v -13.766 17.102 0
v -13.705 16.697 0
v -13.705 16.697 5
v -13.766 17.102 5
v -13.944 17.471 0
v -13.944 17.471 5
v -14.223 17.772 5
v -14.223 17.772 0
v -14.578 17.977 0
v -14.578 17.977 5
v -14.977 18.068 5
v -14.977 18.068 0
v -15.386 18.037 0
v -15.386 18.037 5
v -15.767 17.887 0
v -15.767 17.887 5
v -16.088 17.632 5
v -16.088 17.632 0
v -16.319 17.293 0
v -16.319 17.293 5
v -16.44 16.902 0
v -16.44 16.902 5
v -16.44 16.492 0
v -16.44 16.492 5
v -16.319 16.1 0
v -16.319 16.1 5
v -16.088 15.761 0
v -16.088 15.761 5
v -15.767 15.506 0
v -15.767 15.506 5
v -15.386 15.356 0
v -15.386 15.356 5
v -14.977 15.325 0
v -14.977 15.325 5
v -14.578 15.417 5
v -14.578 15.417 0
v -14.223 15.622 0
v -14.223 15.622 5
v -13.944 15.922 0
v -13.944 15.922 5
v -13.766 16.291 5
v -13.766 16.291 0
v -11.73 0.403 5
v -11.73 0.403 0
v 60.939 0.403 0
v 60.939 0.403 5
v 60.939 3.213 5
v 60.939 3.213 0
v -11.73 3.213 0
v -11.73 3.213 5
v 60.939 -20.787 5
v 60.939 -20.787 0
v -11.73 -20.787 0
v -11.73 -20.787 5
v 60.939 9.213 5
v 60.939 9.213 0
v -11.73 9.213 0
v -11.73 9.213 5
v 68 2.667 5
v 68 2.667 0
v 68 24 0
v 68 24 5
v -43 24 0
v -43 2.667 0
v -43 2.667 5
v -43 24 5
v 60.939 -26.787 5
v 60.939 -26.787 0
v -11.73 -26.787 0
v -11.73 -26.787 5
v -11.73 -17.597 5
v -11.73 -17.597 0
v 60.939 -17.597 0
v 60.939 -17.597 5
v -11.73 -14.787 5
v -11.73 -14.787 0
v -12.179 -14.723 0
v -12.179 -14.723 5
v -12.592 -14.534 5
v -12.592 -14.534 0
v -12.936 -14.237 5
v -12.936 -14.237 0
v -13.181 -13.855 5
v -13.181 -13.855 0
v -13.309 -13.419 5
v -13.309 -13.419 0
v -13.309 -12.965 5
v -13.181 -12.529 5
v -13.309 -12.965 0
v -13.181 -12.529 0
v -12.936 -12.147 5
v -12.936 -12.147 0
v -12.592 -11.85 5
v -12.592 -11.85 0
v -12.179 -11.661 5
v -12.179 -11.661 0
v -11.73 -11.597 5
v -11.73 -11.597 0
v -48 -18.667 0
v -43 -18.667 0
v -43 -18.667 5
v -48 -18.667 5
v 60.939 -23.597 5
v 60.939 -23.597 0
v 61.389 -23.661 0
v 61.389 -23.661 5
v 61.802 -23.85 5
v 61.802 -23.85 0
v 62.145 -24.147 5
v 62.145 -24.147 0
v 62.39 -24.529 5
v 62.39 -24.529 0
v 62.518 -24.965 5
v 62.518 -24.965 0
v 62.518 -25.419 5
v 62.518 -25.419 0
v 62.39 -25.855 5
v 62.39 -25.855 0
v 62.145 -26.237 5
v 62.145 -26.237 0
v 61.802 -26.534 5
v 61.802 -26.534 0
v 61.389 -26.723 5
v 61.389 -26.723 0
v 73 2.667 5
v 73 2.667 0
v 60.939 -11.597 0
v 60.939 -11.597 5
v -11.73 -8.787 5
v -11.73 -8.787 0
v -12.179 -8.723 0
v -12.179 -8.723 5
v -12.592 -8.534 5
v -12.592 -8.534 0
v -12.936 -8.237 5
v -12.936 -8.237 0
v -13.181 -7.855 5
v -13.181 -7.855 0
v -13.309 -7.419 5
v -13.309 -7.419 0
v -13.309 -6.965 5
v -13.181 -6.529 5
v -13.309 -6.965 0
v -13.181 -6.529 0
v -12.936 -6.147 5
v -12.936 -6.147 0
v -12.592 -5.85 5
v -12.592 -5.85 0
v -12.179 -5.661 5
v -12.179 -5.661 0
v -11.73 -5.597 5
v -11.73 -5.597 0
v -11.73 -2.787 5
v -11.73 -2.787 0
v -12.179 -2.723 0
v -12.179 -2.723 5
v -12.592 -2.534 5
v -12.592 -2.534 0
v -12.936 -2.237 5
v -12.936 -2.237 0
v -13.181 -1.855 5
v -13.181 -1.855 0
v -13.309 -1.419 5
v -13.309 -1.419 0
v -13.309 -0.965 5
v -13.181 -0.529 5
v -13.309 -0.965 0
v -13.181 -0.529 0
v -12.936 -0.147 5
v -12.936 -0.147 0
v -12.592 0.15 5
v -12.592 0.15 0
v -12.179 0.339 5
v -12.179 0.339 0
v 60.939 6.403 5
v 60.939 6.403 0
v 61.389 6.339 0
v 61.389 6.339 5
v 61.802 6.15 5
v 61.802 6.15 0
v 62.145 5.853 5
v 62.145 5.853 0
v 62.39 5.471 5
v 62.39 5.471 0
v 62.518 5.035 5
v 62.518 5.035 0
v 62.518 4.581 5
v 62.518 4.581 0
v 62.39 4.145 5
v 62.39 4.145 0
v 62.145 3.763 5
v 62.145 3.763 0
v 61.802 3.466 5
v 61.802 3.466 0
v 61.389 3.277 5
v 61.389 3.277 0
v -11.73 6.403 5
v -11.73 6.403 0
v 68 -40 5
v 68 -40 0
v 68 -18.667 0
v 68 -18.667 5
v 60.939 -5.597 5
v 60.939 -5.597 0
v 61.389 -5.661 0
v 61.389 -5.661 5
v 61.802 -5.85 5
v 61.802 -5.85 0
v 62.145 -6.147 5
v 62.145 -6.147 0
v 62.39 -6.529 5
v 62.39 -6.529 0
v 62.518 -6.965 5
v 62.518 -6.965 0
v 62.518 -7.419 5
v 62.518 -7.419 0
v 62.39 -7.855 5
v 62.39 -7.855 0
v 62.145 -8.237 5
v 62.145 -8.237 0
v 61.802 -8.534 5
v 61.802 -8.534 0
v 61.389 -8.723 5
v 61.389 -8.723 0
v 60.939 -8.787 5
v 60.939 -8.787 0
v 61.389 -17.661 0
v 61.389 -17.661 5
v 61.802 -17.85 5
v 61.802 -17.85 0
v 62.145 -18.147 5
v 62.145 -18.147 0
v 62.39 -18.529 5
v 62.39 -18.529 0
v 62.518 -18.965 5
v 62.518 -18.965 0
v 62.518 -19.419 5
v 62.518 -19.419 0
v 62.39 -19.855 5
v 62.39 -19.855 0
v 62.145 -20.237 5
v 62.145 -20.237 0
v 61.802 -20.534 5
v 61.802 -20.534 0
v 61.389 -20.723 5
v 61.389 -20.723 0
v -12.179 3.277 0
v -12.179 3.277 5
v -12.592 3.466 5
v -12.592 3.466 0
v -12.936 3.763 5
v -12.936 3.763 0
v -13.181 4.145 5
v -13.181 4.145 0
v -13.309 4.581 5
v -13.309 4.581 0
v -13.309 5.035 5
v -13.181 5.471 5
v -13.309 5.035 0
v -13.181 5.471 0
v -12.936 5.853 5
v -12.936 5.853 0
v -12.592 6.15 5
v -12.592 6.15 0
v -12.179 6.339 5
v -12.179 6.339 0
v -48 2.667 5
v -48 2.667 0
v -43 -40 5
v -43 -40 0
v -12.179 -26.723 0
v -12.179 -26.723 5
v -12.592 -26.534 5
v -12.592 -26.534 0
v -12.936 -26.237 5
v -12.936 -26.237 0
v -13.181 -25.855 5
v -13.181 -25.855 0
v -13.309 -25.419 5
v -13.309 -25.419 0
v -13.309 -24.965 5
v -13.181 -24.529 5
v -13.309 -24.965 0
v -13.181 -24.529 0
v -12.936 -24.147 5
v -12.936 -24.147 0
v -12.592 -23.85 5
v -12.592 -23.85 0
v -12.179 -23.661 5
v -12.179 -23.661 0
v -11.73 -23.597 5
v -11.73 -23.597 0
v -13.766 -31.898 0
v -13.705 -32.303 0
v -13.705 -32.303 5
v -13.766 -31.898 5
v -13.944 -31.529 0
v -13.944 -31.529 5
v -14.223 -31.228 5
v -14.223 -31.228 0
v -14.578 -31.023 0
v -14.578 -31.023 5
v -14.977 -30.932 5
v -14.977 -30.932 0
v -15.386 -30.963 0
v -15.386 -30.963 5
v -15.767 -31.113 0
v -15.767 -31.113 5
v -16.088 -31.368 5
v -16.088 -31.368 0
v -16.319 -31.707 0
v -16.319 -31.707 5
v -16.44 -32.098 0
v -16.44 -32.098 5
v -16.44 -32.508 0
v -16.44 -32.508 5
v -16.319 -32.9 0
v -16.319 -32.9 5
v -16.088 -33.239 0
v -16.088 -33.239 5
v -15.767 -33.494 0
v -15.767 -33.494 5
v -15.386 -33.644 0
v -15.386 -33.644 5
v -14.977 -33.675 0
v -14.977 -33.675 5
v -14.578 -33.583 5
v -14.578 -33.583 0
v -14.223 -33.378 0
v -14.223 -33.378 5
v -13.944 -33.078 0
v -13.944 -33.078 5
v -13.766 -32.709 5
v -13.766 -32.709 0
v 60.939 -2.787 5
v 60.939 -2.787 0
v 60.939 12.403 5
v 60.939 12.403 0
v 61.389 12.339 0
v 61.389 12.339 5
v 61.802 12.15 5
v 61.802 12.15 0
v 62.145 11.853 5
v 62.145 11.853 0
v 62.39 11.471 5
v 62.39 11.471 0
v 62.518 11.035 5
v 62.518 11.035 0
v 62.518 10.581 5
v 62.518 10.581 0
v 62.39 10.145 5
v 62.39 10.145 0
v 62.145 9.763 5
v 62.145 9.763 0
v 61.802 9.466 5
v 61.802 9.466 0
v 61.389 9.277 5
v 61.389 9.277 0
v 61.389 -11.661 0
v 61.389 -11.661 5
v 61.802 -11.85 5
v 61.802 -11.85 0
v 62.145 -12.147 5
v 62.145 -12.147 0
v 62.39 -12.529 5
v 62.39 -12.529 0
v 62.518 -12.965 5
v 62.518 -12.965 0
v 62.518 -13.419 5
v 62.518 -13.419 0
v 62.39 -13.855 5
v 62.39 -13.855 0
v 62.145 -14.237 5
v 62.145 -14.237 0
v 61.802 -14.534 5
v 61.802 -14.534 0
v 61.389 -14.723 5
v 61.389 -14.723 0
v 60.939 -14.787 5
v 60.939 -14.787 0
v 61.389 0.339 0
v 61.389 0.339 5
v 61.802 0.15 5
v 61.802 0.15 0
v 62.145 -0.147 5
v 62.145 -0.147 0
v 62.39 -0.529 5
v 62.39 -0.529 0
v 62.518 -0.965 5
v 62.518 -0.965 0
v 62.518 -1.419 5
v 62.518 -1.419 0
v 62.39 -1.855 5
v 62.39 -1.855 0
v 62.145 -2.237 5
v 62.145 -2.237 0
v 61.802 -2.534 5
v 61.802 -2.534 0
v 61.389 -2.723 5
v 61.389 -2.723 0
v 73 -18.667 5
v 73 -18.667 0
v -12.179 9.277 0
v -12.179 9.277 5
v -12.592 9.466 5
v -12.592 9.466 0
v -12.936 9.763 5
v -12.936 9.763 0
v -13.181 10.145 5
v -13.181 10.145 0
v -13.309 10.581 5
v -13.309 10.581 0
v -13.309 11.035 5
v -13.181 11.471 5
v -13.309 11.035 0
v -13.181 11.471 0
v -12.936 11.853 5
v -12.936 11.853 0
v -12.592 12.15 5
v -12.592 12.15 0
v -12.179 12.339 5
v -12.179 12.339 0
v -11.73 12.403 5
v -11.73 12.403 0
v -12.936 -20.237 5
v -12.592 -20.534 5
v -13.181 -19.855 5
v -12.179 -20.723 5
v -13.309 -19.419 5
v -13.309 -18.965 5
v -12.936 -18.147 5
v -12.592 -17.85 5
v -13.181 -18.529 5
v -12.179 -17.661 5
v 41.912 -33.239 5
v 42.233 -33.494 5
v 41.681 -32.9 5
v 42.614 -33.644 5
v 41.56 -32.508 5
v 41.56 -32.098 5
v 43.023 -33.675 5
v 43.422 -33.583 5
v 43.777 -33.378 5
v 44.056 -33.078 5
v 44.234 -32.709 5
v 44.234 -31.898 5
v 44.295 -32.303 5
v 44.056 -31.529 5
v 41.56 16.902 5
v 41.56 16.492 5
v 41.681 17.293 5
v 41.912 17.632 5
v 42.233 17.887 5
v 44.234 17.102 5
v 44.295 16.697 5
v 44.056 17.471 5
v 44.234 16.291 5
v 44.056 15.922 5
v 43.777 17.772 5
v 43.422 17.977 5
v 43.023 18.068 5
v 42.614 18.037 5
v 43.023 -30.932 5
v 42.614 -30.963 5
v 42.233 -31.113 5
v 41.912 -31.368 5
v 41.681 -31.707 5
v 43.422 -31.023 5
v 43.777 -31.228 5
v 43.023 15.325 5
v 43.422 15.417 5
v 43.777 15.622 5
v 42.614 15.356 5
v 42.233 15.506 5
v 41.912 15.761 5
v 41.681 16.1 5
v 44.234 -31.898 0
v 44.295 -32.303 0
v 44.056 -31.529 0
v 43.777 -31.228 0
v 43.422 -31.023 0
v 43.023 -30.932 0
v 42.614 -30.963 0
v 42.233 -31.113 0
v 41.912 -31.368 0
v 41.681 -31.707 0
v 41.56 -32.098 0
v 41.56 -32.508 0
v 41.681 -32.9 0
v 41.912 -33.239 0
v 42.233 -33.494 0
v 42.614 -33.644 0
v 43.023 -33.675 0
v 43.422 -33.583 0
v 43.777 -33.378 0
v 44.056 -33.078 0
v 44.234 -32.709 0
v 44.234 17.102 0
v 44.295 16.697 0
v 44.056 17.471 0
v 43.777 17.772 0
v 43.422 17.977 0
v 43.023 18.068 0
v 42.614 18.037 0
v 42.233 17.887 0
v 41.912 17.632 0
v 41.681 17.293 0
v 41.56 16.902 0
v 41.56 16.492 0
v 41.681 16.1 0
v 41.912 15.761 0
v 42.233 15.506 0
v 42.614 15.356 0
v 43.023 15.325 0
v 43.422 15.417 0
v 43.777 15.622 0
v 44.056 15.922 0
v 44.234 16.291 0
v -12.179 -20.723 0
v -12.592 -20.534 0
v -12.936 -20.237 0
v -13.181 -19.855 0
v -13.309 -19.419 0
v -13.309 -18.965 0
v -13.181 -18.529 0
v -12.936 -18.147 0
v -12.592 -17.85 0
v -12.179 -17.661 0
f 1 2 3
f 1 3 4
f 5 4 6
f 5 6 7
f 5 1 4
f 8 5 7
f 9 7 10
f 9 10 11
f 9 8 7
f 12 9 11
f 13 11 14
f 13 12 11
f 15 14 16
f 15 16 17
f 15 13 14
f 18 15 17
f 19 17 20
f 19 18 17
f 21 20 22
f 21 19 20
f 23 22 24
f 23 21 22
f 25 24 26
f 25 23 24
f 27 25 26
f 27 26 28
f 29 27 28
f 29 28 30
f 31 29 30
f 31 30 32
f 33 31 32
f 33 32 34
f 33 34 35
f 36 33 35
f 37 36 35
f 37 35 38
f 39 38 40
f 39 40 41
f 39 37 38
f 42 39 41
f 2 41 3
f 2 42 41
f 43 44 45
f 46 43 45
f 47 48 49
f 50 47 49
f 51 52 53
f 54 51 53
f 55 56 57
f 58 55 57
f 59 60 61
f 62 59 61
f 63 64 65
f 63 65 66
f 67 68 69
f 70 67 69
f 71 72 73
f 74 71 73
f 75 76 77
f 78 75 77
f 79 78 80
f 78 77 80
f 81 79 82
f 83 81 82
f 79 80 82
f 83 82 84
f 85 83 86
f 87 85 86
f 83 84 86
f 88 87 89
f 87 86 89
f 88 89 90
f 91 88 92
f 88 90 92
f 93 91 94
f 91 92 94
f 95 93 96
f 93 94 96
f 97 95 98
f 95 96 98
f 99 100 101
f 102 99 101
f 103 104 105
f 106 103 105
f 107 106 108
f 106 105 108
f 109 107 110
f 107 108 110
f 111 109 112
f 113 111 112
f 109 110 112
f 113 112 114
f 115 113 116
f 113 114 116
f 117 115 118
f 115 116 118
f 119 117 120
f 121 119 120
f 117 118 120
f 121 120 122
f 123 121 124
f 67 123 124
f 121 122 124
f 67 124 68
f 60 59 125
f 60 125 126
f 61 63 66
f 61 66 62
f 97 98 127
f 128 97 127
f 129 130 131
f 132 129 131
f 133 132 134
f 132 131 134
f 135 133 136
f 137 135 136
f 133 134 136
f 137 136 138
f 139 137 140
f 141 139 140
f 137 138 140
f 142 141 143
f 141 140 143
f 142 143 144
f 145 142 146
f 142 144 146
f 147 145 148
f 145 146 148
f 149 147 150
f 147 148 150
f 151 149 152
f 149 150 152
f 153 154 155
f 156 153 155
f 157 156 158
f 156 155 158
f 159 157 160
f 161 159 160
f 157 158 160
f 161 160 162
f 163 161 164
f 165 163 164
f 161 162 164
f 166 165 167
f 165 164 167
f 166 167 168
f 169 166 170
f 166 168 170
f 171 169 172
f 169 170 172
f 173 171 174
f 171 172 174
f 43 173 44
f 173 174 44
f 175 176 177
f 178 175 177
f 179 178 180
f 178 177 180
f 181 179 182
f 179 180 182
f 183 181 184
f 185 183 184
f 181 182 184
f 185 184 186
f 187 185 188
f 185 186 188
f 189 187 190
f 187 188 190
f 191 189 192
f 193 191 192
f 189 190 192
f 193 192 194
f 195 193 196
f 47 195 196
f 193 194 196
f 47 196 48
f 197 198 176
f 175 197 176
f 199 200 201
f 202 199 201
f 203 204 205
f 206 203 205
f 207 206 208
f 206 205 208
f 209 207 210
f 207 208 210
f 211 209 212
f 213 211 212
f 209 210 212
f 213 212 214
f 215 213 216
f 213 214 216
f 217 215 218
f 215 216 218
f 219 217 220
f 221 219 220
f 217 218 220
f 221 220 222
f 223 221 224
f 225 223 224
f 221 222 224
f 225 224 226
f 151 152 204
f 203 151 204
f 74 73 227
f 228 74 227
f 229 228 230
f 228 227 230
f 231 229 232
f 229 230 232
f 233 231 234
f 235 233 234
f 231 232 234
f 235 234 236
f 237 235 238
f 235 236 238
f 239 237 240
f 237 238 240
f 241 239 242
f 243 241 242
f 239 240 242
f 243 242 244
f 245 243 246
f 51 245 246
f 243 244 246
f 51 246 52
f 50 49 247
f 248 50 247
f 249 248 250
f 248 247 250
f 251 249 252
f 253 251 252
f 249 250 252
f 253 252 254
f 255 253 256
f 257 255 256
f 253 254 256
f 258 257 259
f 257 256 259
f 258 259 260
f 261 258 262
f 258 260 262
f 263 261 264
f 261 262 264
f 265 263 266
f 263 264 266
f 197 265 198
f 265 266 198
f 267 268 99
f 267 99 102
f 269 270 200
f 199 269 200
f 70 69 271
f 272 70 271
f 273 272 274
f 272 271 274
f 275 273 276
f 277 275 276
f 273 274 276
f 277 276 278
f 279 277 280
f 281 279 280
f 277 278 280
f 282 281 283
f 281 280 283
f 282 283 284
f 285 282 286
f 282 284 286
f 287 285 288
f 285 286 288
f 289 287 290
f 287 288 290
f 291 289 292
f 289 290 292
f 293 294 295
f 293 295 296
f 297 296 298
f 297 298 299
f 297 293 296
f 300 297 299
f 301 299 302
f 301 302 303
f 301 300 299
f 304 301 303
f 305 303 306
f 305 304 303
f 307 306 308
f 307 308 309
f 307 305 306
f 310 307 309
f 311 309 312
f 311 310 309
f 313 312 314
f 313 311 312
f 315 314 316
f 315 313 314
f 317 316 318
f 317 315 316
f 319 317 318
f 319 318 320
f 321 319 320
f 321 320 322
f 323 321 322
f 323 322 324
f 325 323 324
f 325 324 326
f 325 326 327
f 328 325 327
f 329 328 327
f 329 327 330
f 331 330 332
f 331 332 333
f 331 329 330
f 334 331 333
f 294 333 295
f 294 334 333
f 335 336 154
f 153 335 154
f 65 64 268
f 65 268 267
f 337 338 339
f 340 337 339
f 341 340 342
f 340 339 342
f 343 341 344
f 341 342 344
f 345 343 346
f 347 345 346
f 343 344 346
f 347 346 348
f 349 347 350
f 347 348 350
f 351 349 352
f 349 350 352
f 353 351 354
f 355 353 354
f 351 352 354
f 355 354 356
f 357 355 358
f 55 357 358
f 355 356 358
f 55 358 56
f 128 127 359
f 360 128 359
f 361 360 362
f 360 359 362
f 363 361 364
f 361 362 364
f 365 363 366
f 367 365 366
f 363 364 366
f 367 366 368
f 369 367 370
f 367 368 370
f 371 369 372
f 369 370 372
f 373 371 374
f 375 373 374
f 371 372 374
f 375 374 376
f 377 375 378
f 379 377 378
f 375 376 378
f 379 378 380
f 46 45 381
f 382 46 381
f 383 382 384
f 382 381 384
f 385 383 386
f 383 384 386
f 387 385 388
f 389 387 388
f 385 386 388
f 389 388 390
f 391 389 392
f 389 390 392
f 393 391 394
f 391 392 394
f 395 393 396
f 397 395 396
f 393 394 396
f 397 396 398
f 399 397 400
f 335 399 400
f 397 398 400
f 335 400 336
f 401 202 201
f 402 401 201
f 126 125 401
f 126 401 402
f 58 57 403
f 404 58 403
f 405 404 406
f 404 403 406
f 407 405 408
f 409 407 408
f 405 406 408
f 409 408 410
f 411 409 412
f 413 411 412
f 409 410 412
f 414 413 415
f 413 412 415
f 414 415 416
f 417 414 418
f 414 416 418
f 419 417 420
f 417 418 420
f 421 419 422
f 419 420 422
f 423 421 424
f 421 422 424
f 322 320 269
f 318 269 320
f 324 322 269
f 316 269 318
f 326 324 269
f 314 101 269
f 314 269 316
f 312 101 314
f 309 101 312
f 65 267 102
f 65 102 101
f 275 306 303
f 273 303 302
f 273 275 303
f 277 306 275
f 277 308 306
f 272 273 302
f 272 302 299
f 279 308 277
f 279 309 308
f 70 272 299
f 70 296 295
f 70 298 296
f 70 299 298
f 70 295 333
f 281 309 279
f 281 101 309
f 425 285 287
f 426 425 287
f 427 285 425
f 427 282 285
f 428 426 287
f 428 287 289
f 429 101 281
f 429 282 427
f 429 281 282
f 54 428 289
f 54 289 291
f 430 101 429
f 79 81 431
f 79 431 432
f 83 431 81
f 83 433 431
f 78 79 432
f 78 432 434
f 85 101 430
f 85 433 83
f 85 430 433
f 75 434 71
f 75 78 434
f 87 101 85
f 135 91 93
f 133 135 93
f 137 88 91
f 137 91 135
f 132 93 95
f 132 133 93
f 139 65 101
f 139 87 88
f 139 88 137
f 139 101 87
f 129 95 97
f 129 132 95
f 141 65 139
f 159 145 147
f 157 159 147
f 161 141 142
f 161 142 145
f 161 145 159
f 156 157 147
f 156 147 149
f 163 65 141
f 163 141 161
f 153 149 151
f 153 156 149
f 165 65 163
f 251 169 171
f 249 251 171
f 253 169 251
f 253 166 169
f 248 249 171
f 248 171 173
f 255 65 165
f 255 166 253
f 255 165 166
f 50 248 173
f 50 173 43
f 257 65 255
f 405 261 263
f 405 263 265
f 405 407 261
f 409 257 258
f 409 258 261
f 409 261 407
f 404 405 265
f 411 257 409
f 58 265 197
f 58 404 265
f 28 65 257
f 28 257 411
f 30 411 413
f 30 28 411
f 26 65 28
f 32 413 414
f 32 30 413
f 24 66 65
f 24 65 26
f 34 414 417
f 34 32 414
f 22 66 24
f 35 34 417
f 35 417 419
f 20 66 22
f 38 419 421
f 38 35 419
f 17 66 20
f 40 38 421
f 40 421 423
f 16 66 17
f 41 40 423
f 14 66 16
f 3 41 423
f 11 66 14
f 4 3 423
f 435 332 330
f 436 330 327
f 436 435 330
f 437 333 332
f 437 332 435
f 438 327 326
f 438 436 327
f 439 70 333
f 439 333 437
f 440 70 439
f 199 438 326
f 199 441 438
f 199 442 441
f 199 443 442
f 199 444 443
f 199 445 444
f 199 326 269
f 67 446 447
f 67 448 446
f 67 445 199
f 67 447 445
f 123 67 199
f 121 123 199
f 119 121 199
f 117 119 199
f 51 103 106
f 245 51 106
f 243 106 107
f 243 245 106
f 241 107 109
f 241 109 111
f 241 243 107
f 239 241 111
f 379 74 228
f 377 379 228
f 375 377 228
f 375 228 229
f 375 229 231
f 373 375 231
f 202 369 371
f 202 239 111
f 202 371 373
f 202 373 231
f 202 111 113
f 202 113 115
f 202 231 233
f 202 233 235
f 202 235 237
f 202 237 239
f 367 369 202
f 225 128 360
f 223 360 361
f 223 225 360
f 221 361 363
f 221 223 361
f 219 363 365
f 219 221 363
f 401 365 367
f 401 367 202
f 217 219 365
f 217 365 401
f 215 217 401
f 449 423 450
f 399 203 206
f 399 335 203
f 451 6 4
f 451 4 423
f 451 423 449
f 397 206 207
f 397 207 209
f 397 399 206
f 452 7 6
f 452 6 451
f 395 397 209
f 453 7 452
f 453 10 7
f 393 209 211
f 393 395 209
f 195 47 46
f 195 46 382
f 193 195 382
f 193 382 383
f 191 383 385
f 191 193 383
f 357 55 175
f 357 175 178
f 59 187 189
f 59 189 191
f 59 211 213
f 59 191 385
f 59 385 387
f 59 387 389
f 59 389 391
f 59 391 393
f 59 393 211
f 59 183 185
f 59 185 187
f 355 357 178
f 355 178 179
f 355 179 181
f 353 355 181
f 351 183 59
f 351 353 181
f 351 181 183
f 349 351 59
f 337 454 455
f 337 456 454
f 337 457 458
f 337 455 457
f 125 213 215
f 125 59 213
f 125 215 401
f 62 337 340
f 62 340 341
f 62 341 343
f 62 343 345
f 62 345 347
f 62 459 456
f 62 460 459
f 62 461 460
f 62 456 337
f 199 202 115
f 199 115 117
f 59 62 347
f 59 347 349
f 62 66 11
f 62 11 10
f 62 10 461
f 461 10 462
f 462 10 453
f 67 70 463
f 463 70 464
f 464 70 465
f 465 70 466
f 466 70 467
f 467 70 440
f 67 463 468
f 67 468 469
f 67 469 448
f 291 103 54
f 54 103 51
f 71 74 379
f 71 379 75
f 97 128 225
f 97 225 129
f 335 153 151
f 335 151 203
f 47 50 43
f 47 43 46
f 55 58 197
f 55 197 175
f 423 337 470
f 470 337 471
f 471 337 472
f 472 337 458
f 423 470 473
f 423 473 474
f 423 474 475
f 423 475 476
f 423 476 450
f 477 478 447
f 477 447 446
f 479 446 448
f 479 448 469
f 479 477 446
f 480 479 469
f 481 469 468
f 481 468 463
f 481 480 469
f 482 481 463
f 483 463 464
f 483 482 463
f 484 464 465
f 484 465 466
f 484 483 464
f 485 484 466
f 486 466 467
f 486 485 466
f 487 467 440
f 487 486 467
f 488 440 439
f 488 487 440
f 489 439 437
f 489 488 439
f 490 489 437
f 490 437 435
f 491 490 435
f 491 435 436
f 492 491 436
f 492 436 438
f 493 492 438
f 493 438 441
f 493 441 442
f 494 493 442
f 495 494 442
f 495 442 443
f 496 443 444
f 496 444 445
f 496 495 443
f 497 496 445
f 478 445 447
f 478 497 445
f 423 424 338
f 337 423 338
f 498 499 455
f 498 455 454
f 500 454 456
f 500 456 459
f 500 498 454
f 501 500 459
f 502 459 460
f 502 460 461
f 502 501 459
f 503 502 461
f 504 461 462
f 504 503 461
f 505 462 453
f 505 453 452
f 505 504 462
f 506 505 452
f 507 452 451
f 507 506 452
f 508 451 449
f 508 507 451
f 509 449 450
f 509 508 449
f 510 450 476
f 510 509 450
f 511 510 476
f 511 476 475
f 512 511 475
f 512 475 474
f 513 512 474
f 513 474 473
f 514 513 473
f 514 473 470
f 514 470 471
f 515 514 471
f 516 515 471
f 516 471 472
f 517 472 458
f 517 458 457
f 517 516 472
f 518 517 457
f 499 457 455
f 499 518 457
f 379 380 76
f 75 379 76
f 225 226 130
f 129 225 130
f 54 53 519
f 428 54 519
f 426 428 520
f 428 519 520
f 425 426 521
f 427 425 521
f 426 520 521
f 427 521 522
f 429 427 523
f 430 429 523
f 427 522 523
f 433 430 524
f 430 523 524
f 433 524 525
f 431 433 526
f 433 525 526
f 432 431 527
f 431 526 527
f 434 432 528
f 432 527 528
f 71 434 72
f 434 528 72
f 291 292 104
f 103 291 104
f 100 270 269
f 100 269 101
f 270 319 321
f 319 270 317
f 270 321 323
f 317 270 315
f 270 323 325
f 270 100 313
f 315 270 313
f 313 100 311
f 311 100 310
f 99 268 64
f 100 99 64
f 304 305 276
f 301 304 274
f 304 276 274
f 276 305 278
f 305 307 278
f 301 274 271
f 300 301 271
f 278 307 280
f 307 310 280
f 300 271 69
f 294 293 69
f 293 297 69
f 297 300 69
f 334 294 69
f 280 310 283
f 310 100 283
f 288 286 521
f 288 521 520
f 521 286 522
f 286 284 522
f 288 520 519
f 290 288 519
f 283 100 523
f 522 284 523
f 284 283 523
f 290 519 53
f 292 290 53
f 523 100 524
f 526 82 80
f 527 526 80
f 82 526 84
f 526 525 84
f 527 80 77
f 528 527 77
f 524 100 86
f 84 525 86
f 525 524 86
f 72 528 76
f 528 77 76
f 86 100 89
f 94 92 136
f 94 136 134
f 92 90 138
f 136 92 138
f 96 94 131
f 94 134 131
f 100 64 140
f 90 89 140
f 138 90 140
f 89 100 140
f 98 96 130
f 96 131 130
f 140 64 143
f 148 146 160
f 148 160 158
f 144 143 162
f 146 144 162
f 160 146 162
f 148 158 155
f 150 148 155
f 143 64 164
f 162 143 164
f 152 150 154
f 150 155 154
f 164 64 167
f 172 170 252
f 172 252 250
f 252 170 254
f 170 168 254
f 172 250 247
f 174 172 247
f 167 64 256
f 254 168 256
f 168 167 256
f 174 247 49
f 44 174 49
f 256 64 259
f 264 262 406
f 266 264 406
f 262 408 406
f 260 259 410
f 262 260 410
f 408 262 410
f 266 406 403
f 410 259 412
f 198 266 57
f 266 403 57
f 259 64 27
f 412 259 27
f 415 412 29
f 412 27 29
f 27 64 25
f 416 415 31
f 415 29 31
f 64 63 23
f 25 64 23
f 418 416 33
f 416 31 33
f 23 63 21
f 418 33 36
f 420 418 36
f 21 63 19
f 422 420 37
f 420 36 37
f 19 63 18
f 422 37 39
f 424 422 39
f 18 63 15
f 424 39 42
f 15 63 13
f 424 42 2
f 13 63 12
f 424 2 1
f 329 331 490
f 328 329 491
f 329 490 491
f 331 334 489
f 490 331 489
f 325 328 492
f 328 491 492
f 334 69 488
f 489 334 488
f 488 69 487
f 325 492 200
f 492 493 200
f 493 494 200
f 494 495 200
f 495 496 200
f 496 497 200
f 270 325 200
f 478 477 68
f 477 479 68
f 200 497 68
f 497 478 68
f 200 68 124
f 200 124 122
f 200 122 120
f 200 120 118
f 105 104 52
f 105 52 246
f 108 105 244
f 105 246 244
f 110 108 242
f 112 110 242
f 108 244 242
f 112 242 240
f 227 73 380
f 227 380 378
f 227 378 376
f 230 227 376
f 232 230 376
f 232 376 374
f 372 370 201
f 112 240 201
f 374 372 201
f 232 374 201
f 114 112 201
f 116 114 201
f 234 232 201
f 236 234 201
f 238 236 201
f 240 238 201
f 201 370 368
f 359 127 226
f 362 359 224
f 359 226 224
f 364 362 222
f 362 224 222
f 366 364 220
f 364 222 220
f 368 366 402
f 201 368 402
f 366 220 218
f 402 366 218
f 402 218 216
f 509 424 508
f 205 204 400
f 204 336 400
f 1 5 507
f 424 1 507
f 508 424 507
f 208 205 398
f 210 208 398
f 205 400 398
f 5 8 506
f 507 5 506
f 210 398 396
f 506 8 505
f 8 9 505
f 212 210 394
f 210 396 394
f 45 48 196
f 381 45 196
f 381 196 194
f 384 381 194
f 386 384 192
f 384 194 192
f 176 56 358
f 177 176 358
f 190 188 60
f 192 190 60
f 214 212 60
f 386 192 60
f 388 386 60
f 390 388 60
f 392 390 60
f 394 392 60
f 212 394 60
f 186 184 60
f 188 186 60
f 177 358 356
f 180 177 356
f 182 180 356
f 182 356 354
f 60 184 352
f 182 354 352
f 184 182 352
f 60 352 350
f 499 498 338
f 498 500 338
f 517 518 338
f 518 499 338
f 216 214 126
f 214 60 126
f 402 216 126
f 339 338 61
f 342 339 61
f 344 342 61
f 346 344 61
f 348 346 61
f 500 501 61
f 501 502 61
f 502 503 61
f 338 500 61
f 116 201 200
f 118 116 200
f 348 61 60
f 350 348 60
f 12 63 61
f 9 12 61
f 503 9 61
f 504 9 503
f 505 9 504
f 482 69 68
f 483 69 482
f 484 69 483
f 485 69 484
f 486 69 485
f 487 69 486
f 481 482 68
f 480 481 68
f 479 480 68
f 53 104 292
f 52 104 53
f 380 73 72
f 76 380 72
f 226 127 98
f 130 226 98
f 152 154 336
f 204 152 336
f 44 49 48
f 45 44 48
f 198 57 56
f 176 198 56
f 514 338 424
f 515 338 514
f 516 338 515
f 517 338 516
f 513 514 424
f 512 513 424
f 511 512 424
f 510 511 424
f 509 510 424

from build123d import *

# Parameters (mm, degrees)
CROQUIS1_W              = 111
CROQUIS1_H              = 64
CROQUIS1_R              = 1.375
SALIENTE_EXTRUIR1_DEPTH = 5
CROQUIS2_W              = 5
CROQUIS2_H              = 21.333333334
SALIENTE_EXTRUIR2_DEPTH = 5
CROQUIS3_W              = 5
CROQUIS3_H              = 21.333333334
SALIENTE_EXTRUIR3_DEPTH = 5


with BuildPart() as part:
    # Croquis1 → Saliente-Extruir1 (new body)
    with BuildSketch(Plane.XY):
        with Locations((12.5, -8)):
            Rectangle(CROQUIS1_W, CROQUIS1_H)
        with Locations((42.920083817, -32.303397977)):
            Circle(CROQUIS1_R, mode=Mode.SUBTRACT)
        with Locations((42.920083817, 16.696602023)):
            Circle(CROQUIS1_R, mode=Mode.SUBTRACT)
        with Locations((-15.079916183, -32.303397977)):
            Circle(CROQUIS1_R, mode=Mode.SUBTRACT)
        with Locations((-15.079916183, 16.696602023)):
            Circle(CROQUIS1_R, mode=Mode.SUBTRACT)
        with BuildLine():
            Line((60.939336221, 9.212655439), (-11.729916183, 9.212655439))
            ThreePointArc((-11.729916183, 9.212655439), (-13.325171123, 10.807910378), (-11.729916183, 12.403165318))
            Line((-11.729916183, 12.403165318), (60.939336221, 12.403165318))
            ThreePointArc((60.939336221, 12.403165318), (62.53459116, 10.807910378), (60.939336221, 9.212655439))
        make_face(mode=Mode.SUBTRACT)
        with BuildLine():
            Line((60.939336221, 3.212655439), (-11.729916183, 3.212655439))
            ThreePointArc((-11.729916183, 3.212655439), (-13.325171123, 4.807910378), (-11.729916183, 6.403165318))
            Line((-11.729916183, 6.403165318), (60.939336221, 6.403165318))
            ThreePointArc((60.939336221, 6.403165318), (62.53459116, 4.807910378), (60.939336221, 3.212655439))
        make_face(mode=Mode.SUBTRACT)
        with BuildLine():
            Line((60.939336221, -2.787344561), (-11.729916183, -2.787344561))
            ThreePointArc((-11.729916183, -2.787344561), (-13.325171123, -1.192089622), (-11.729916183, 0.403165318))
            Line((-11.729916183, 0.403165318), (60.939336221, 0.403165318))
            ThreePointArc((60.939336221, 0.403165318), (62.53459116, -1.192089622), (60.939336221, -2.787344561))
        make_face(mode=Mode.SUBTRACT)
        with BuildLine():
            Line((60.939336221, -8.787344561), (-11.729916183, -8.787344561))
            ThreePointArc((-11.729916183, -8.787344561), (-13.325171123, -7.192089622), (-11.729916183, -5.596834682))
            Line((-11.729916183, -5.596834682), (60.939336221, -5.596834682))
            ThreePointArc((60.939336221, -5.596834682), (62.53459116, -7.192089622), (60.939336221, -8.787344561))
        make_face(mode=Mode.SUBTRACT)
        with BuildLine():
            Line((60.939336221, -14.787344561), (-11.729916183, -14.787344561))
            ThreePointArc((-11.729916183, -14.787344561), (-13.325171123, -13.192089622), (-11.729916183, -11.596834682))
            Line((-11.729916183, -11.596834682), (60.939336221, -11.596834682))
            ThreePointArc((60.939336221, -11.596834682), (62.53459116, -13.192089622), (60.939336221, -14.787344561))
        make_face(mode=Mode.SUBTRACT)
        with BuildLine():
            Line((60.939336221, -20.787344561), (-11.729916183, -20.787344561))
            ThreePointArc((-11.729916183, -20.787344561), (-13.325171123, -19.192089622), (-11.729916183, -17.596834682))
            Line((-11.729916183, -17.596834682), (60.939336221, -17.596834682))
            ThreePointArc((60.939336221, -17.596834682), (62.53459116, -19.192089622), (60.939336221, -20.787344561))
        make_face(mode=Mode.SUBTRACT)
        with BuildLine():
            Line((60.939336221, -26.787344561), (-11.729916183, -26.787344561))
            ThreePointArc((-11.729916183, -26.787344561), (-13.325171123, -25.192089622), (-11.729916183, -23.596834682))
            Line((-11.729916183, -23.596834682), (60.939336221, -23.596834682))
            ThreePointArc((60.939336221, -23.596834682), (62.53459116, -25.192089622), (60.939336221, -26.787344561))
        make_face(mode=Mode.SUBTRACT)
    extrude(amount=SALIENTE_EXTRUIR1_DEPTH)

    # Croquis2 → Saliente-Extruir2 (add)
    with BuildSketch(Plane(origin=(68, 0, 0), x_dir=(0, 0, -1), z_dir=(1, 0, 0))):
        with Locations((-2.5, -8)):
            Rectangle(CROQUIS2_W, CROQUIS2_H)
    extrude(amount=SALIENTE_EXTRUIR2_DEPTH)

    # Croquis3 → Saliente-Extruir3 (add)
    with BuildSketch(Plane.ZY.offset(43)):
        with Locations((2.5, -8)):
            Rectangle(CROQUIS3_W, CROQUIS3_H)
    extrude(amount=SALIENTE_EXTRUIR3_DEPTH)


solid = part.part
